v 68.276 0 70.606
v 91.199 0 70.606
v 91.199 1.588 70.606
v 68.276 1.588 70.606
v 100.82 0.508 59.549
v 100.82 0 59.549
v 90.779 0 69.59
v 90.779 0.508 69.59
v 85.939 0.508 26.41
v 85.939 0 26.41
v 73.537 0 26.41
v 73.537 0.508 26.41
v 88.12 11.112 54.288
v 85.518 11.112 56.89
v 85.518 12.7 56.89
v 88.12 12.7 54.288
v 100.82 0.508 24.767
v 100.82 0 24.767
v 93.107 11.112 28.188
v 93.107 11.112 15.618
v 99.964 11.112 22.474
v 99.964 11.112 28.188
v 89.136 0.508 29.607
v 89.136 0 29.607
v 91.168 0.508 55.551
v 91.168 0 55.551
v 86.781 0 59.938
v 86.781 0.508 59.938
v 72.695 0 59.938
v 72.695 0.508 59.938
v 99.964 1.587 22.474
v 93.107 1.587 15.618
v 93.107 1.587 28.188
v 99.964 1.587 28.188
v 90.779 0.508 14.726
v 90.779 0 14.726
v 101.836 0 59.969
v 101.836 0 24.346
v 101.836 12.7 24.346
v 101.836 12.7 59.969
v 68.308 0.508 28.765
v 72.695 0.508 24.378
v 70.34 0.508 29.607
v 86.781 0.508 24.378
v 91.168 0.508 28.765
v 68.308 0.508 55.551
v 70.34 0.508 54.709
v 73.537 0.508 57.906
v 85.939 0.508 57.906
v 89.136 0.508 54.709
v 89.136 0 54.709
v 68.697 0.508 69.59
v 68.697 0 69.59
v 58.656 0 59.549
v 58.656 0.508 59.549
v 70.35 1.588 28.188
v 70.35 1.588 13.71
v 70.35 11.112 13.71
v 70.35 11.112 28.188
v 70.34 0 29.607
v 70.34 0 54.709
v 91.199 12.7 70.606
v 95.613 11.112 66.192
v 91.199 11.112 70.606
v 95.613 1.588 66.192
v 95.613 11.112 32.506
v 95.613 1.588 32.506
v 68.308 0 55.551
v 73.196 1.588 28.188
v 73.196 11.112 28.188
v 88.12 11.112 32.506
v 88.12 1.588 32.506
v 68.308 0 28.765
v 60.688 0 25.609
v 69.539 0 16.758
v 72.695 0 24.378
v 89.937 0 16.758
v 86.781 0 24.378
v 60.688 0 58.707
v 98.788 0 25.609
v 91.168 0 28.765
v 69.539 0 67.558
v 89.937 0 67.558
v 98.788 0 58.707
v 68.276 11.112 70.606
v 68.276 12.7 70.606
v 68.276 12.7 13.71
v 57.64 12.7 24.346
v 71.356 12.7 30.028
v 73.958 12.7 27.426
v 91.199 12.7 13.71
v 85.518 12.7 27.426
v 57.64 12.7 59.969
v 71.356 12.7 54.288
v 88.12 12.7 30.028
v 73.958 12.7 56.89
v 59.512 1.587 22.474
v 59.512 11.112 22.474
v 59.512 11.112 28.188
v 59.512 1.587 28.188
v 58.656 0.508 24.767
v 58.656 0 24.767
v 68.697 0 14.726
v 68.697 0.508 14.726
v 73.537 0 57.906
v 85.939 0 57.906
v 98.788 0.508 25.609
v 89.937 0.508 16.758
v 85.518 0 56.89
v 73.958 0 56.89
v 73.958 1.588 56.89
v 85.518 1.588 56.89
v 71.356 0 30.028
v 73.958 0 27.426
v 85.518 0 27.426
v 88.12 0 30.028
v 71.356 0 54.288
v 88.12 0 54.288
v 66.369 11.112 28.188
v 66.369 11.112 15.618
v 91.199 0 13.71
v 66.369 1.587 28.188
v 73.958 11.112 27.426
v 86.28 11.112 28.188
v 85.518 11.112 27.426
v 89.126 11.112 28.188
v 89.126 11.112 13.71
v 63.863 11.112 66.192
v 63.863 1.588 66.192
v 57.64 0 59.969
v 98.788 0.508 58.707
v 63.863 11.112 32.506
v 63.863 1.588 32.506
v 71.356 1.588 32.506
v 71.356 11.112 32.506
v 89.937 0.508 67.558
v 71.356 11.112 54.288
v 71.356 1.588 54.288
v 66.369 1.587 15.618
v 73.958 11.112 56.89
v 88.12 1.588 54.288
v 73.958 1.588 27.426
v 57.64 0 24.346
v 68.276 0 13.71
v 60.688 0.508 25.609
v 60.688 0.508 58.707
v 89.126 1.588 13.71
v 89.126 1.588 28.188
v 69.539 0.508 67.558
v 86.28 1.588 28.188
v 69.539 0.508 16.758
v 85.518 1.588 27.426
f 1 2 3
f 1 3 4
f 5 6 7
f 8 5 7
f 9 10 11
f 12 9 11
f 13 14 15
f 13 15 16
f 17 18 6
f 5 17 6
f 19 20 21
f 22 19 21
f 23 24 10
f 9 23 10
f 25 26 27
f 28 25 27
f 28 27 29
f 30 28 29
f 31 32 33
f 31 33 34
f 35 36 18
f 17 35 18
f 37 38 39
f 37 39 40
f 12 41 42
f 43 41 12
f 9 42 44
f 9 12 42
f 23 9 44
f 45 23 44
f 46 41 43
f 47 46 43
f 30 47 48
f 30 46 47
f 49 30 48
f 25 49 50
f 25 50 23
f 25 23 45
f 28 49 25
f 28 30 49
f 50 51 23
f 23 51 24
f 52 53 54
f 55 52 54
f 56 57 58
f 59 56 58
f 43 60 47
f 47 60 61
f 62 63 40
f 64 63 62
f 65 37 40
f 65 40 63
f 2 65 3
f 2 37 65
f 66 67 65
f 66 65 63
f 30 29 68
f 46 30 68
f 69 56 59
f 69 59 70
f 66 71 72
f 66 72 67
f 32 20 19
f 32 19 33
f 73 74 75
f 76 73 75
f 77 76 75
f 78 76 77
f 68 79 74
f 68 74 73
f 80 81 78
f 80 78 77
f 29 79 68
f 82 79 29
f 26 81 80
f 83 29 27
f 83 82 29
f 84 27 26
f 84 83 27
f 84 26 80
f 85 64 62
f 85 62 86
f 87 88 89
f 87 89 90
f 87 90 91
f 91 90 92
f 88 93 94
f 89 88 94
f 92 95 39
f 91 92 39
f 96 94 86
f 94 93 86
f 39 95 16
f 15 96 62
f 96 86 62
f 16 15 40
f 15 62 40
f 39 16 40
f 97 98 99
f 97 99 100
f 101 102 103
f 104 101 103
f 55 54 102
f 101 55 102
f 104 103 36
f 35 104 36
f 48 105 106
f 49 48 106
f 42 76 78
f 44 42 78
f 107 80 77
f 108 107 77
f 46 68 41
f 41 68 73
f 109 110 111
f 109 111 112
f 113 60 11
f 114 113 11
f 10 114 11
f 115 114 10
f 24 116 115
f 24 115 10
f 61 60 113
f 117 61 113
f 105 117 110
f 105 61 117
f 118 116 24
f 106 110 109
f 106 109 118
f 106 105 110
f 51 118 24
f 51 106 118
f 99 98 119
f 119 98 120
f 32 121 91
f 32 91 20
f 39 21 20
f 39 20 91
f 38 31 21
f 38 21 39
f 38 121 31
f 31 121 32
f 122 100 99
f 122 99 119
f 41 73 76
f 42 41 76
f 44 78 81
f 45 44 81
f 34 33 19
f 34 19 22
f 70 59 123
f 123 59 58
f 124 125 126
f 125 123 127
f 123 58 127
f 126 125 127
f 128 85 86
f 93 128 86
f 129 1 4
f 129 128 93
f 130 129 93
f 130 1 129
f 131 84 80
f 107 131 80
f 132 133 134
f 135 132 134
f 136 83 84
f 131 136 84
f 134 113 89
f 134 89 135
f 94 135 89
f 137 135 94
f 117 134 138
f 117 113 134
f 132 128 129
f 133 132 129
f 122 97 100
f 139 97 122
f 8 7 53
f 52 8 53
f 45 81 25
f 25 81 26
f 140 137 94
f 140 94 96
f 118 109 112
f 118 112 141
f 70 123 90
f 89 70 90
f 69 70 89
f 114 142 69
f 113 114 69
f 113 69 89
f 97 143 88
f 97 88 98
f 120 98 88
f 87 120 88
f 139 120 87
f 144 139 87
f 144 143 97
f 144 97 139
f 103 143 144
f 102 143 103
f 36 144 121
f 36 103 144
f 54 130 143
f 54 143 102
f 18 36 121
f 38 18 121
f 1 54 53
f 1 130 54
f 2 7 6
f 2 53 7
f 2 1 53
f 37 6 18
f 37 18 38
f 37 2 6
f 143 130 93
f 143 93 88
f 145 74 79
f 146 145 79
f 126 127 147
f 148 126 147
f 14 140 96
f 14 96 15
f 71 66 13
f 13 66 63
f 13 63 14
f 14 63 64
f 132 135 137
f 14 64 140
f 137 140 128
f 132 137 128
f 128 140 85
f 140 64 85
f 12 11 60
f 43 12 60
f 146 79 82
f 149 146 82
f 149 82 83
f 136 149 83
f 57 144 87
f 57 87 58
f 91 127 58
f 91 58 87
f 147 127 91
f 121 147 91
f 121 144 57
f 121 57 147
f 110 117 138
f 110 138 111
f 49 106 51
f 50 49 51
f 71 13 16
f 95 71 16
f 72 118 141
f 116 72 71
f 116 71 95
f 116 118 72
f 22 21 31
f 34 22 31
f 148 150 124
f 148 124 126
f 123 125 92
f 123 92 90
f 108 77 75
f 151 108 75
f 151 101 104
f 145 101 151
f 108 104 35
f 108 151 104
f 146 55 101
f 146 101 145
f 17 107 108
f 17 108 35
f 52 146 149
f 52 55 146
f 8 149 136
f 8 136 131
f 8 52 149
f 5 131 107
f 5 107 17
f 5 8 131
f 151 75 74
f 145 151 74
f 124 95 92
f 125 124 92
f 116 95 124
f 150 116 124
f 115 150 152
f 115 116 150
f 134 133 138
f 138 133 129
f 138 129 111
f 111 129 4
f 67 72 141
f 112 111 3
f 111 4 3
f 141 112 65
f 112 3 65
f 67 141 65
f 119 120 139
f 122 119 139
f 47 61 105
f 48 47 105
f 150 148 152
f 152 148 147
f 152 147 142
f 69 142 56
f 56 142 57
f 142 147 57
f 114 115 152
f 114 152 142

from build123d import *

# Parameters (mm, degrees)
F1_DEPTH = 12.7
F2_DEPTH = 0.508
F3_W     = 15.875
F3_H     = 4.7625
F4_DEPTH = 38.1
F5_W     = 9.388043
F5_H     = 4.7625
F5_W_2   = 6.856441
F5_H_2   = 9.525
F5_W_3   = 6.856442
F6_DEPTH = 14.478


with BuildPart() as f1:
    # F0 (on Front) → F1 (new body)
    with BuildSketch(Plane.XZ):
        Polygon((101.835918, 59.969447), (91.199405, 70.605959), (68.27643, 70.605959), (57.639918, 59.969447), (57.639918, 24.346472), (68.27643, 13.709959), (91.199405, 13.709959), (101.835918, 24.346472), align=None)
        Polygon((68.697271, 69.589959), (90.778564, 69.589959), (100.819918, 59.548606), (100.819918, 24.767313), (90.778564, 14.725959), (68.697271, 14.725959), (58.655918, 24.767313), (58.655918, 59.548606), align=None, mode=Mode.SUBTRACT)
        Polygon((100.819918, 59.548606), (90.778564, 69.589959), (68.697271, 69.589959), (58.655918, 59.548606), (58.655918, 24.767313), (68.697271, 14.725959), (90.778564, 14.725959), (100.819918, 24.767313), align=None)
        Polygon((69.538953, 67.557959), (89.936882, 67.557959), (98.787918, 58.706924), (98.787918, 25.608995), (89.936882, 16.757959), (69.538953, 16.757959), (60.687918, 25.608995), (60.687918, 58.706924), align=None, mode=Mode.SUBTRACT)
        Polygon((98.787918, 58.706924), (89.936882, 67.557959), (69.538953, 67.557959), (60.687918, 58.706924), (60.687918, 25.608995), (69.538953, 16.757959), (89.936882, 16.757959), (98.787918, 25.608995), align=None)
        Polygon((79.737918, 59.937959), (86.780575, 59.937959), (91.167918, 55.550616), (91.167918, 28.765302), (86.780575, 24.377959), (79.737918, 24.377959), (72.695261, 24.377959), (68.307918, 28.765302), (68.307918, 55.550616), (72.695261, 59.937959), align=None, mode=Mode.SUBTRACT)
        Polygon((79.737918, 57.905959), (79.737918, 59.937959), (72.695261, 59.937959), (68.307918, 55.550616), (68.307918, 28.765302), (72.695261, 24.377959), (79.737918, 24.377959), (79.737918, 26.409959), (73.536943, 26.409959), (70.339918, 29.606984), (70.339918, 54.708934), (73.536943, 57.905959), align=None)
        Polygon((79.737918, 56.889959), (79.737918, 57.905959), (73.536943, 57.905959), (70.339918, 54.708934), (70.339918, 29.606984), (73.536943, 26.409959), (79.737918, 26.409959), (79.737918, 27.425959), (73.957784, 27.425959), (71.355918, 30.027825), (71.355918, 54.288093), (73.957784, 56.889959), align=None)
        Polygon((85.938893, 57.905959), (79.737918, 57.905959), (79.737918, 56.889959), (85.518052, 56.889959), (88.119918, 54.288093), (88.119918, 30.027825), (85.518052, 27.425959), (79.737918, 27.425959), (79.737918, 26.409959), (85.938893, 26.409959), (89.135918, 29.606984), (89.135918, 54.708934), align=None)
        Polygon((91.167918, 55.550616), (86.780575, 59.937959), (79.737918, 59.937959), (79.737918, 57.905959), (85.938893, 57.905959), (89.135918, 54.708934), (89.135918, 29.606984), (85.938893, 26.409959), (79.737918, 26.409959), (79.737918, 24.377959), (86.780575, 24.377959), (91.167918, 28.765302), align=None)
    extrude(amount=-F1_DEPTH)

    # F0 (on Front) → F2 (cut)
    with BuildSketch(Plane.XZ):
        Polygon((100.819918, 59.548606), (90.778564, 69.589959), (68.697271, 69.589959), (58.655918, 59.548606), (58.655918, 24.767313), (68.697271, 14.725959), (90.778564, 14.725959), (100.819918, 24.767313), align=None)
        Polygon((69.538953, 67.557959), (89.936882, 67.557959), (98.787918, 58.706924), (98.787918, 25.608995), (89.936882, 16.757959), (69.538953, 16.757959), (60.687918, 25.608995), (60.687918, 58.706924), align=None, mode=Mode.SUBTRACT)
        Polygon((79.737918, 57.905959), (79.737918, 59.937959), (72.695261, 59.937959), (68.307918, 55.550616), (68.307918, 28.765302), (72.695261, 24.377959), (79.737918, 24.377959), (79.737918, 26.409959), (73.536943, 26.409959), (70.339918, 29.606984), (70.339918, 54.708934), (73.536943, 57.905959), align=None)
        Polygon((91.167918, 55.550616), (86.780575, 59.937959), (79.737918, 59.937959), (79.737918, 57.905959), (85.938893, 57.905959), (89.135918, 54.708934), (89.135918, 29.606984), (85.938893, 26.409959), (79.737918, 26.409959), (79.737918, 24.377959), (86.780575, 24.377959), (91.167918, 28.765302), align=None)
    extrude(amount=-F2_DEPTH, mode=Mode.SUBTRACT)

    # F3 (on face) → F4 (cut)
    with BuildSketch(Plane.XY.offset(70.605959)):
        with Locations((71.800418, 8.73125)):
            Rectangle(F3_W, F3_H)
        Polygon((95.612918, 11.1125), (79.737918, 11.1125), (79.737918, 6.35), (79.737918, 1.5875), (95.612918, 1.5875), align=None)
        with Locations((71.800418, 3.96875)):
            Rectangle(F3_W, F3_H)
    extrude(amount=-F4_DEPTH, mode=Mode.SUBTRACT)

    # F5 (on face) → F6 (cut)
    with BuildSketch(Plane(origin=(0, 0, 13.709959), x_dir=(1, 0, 0), z_dir=(0, 0, -1))):
        with Locations((75.043896, -3.96875)):
            Rectangle(F5_W, F5_H)
        with Locations((84.431939, -3.96875)):
            Rectangle(F5_W, F5_H)
        with Locations((75.043896, -8.73125)):
            Rectangle(F5_W, F5_H)
        with Locations((84.431939, -8.73125)):
            Rectangle(F5_W, F5_H)
        with Locations((62.940418, -6.35)):
            Rectangle(F5_W_2, F5_H_2)
        with Locations((96.535417, -6.35)):
            Rectangle(F5_W_3, F5_H_2)
    extrude(amount=-F6_DEPTH, mode=Mode.SUBTRACT)


solid = f1.part
